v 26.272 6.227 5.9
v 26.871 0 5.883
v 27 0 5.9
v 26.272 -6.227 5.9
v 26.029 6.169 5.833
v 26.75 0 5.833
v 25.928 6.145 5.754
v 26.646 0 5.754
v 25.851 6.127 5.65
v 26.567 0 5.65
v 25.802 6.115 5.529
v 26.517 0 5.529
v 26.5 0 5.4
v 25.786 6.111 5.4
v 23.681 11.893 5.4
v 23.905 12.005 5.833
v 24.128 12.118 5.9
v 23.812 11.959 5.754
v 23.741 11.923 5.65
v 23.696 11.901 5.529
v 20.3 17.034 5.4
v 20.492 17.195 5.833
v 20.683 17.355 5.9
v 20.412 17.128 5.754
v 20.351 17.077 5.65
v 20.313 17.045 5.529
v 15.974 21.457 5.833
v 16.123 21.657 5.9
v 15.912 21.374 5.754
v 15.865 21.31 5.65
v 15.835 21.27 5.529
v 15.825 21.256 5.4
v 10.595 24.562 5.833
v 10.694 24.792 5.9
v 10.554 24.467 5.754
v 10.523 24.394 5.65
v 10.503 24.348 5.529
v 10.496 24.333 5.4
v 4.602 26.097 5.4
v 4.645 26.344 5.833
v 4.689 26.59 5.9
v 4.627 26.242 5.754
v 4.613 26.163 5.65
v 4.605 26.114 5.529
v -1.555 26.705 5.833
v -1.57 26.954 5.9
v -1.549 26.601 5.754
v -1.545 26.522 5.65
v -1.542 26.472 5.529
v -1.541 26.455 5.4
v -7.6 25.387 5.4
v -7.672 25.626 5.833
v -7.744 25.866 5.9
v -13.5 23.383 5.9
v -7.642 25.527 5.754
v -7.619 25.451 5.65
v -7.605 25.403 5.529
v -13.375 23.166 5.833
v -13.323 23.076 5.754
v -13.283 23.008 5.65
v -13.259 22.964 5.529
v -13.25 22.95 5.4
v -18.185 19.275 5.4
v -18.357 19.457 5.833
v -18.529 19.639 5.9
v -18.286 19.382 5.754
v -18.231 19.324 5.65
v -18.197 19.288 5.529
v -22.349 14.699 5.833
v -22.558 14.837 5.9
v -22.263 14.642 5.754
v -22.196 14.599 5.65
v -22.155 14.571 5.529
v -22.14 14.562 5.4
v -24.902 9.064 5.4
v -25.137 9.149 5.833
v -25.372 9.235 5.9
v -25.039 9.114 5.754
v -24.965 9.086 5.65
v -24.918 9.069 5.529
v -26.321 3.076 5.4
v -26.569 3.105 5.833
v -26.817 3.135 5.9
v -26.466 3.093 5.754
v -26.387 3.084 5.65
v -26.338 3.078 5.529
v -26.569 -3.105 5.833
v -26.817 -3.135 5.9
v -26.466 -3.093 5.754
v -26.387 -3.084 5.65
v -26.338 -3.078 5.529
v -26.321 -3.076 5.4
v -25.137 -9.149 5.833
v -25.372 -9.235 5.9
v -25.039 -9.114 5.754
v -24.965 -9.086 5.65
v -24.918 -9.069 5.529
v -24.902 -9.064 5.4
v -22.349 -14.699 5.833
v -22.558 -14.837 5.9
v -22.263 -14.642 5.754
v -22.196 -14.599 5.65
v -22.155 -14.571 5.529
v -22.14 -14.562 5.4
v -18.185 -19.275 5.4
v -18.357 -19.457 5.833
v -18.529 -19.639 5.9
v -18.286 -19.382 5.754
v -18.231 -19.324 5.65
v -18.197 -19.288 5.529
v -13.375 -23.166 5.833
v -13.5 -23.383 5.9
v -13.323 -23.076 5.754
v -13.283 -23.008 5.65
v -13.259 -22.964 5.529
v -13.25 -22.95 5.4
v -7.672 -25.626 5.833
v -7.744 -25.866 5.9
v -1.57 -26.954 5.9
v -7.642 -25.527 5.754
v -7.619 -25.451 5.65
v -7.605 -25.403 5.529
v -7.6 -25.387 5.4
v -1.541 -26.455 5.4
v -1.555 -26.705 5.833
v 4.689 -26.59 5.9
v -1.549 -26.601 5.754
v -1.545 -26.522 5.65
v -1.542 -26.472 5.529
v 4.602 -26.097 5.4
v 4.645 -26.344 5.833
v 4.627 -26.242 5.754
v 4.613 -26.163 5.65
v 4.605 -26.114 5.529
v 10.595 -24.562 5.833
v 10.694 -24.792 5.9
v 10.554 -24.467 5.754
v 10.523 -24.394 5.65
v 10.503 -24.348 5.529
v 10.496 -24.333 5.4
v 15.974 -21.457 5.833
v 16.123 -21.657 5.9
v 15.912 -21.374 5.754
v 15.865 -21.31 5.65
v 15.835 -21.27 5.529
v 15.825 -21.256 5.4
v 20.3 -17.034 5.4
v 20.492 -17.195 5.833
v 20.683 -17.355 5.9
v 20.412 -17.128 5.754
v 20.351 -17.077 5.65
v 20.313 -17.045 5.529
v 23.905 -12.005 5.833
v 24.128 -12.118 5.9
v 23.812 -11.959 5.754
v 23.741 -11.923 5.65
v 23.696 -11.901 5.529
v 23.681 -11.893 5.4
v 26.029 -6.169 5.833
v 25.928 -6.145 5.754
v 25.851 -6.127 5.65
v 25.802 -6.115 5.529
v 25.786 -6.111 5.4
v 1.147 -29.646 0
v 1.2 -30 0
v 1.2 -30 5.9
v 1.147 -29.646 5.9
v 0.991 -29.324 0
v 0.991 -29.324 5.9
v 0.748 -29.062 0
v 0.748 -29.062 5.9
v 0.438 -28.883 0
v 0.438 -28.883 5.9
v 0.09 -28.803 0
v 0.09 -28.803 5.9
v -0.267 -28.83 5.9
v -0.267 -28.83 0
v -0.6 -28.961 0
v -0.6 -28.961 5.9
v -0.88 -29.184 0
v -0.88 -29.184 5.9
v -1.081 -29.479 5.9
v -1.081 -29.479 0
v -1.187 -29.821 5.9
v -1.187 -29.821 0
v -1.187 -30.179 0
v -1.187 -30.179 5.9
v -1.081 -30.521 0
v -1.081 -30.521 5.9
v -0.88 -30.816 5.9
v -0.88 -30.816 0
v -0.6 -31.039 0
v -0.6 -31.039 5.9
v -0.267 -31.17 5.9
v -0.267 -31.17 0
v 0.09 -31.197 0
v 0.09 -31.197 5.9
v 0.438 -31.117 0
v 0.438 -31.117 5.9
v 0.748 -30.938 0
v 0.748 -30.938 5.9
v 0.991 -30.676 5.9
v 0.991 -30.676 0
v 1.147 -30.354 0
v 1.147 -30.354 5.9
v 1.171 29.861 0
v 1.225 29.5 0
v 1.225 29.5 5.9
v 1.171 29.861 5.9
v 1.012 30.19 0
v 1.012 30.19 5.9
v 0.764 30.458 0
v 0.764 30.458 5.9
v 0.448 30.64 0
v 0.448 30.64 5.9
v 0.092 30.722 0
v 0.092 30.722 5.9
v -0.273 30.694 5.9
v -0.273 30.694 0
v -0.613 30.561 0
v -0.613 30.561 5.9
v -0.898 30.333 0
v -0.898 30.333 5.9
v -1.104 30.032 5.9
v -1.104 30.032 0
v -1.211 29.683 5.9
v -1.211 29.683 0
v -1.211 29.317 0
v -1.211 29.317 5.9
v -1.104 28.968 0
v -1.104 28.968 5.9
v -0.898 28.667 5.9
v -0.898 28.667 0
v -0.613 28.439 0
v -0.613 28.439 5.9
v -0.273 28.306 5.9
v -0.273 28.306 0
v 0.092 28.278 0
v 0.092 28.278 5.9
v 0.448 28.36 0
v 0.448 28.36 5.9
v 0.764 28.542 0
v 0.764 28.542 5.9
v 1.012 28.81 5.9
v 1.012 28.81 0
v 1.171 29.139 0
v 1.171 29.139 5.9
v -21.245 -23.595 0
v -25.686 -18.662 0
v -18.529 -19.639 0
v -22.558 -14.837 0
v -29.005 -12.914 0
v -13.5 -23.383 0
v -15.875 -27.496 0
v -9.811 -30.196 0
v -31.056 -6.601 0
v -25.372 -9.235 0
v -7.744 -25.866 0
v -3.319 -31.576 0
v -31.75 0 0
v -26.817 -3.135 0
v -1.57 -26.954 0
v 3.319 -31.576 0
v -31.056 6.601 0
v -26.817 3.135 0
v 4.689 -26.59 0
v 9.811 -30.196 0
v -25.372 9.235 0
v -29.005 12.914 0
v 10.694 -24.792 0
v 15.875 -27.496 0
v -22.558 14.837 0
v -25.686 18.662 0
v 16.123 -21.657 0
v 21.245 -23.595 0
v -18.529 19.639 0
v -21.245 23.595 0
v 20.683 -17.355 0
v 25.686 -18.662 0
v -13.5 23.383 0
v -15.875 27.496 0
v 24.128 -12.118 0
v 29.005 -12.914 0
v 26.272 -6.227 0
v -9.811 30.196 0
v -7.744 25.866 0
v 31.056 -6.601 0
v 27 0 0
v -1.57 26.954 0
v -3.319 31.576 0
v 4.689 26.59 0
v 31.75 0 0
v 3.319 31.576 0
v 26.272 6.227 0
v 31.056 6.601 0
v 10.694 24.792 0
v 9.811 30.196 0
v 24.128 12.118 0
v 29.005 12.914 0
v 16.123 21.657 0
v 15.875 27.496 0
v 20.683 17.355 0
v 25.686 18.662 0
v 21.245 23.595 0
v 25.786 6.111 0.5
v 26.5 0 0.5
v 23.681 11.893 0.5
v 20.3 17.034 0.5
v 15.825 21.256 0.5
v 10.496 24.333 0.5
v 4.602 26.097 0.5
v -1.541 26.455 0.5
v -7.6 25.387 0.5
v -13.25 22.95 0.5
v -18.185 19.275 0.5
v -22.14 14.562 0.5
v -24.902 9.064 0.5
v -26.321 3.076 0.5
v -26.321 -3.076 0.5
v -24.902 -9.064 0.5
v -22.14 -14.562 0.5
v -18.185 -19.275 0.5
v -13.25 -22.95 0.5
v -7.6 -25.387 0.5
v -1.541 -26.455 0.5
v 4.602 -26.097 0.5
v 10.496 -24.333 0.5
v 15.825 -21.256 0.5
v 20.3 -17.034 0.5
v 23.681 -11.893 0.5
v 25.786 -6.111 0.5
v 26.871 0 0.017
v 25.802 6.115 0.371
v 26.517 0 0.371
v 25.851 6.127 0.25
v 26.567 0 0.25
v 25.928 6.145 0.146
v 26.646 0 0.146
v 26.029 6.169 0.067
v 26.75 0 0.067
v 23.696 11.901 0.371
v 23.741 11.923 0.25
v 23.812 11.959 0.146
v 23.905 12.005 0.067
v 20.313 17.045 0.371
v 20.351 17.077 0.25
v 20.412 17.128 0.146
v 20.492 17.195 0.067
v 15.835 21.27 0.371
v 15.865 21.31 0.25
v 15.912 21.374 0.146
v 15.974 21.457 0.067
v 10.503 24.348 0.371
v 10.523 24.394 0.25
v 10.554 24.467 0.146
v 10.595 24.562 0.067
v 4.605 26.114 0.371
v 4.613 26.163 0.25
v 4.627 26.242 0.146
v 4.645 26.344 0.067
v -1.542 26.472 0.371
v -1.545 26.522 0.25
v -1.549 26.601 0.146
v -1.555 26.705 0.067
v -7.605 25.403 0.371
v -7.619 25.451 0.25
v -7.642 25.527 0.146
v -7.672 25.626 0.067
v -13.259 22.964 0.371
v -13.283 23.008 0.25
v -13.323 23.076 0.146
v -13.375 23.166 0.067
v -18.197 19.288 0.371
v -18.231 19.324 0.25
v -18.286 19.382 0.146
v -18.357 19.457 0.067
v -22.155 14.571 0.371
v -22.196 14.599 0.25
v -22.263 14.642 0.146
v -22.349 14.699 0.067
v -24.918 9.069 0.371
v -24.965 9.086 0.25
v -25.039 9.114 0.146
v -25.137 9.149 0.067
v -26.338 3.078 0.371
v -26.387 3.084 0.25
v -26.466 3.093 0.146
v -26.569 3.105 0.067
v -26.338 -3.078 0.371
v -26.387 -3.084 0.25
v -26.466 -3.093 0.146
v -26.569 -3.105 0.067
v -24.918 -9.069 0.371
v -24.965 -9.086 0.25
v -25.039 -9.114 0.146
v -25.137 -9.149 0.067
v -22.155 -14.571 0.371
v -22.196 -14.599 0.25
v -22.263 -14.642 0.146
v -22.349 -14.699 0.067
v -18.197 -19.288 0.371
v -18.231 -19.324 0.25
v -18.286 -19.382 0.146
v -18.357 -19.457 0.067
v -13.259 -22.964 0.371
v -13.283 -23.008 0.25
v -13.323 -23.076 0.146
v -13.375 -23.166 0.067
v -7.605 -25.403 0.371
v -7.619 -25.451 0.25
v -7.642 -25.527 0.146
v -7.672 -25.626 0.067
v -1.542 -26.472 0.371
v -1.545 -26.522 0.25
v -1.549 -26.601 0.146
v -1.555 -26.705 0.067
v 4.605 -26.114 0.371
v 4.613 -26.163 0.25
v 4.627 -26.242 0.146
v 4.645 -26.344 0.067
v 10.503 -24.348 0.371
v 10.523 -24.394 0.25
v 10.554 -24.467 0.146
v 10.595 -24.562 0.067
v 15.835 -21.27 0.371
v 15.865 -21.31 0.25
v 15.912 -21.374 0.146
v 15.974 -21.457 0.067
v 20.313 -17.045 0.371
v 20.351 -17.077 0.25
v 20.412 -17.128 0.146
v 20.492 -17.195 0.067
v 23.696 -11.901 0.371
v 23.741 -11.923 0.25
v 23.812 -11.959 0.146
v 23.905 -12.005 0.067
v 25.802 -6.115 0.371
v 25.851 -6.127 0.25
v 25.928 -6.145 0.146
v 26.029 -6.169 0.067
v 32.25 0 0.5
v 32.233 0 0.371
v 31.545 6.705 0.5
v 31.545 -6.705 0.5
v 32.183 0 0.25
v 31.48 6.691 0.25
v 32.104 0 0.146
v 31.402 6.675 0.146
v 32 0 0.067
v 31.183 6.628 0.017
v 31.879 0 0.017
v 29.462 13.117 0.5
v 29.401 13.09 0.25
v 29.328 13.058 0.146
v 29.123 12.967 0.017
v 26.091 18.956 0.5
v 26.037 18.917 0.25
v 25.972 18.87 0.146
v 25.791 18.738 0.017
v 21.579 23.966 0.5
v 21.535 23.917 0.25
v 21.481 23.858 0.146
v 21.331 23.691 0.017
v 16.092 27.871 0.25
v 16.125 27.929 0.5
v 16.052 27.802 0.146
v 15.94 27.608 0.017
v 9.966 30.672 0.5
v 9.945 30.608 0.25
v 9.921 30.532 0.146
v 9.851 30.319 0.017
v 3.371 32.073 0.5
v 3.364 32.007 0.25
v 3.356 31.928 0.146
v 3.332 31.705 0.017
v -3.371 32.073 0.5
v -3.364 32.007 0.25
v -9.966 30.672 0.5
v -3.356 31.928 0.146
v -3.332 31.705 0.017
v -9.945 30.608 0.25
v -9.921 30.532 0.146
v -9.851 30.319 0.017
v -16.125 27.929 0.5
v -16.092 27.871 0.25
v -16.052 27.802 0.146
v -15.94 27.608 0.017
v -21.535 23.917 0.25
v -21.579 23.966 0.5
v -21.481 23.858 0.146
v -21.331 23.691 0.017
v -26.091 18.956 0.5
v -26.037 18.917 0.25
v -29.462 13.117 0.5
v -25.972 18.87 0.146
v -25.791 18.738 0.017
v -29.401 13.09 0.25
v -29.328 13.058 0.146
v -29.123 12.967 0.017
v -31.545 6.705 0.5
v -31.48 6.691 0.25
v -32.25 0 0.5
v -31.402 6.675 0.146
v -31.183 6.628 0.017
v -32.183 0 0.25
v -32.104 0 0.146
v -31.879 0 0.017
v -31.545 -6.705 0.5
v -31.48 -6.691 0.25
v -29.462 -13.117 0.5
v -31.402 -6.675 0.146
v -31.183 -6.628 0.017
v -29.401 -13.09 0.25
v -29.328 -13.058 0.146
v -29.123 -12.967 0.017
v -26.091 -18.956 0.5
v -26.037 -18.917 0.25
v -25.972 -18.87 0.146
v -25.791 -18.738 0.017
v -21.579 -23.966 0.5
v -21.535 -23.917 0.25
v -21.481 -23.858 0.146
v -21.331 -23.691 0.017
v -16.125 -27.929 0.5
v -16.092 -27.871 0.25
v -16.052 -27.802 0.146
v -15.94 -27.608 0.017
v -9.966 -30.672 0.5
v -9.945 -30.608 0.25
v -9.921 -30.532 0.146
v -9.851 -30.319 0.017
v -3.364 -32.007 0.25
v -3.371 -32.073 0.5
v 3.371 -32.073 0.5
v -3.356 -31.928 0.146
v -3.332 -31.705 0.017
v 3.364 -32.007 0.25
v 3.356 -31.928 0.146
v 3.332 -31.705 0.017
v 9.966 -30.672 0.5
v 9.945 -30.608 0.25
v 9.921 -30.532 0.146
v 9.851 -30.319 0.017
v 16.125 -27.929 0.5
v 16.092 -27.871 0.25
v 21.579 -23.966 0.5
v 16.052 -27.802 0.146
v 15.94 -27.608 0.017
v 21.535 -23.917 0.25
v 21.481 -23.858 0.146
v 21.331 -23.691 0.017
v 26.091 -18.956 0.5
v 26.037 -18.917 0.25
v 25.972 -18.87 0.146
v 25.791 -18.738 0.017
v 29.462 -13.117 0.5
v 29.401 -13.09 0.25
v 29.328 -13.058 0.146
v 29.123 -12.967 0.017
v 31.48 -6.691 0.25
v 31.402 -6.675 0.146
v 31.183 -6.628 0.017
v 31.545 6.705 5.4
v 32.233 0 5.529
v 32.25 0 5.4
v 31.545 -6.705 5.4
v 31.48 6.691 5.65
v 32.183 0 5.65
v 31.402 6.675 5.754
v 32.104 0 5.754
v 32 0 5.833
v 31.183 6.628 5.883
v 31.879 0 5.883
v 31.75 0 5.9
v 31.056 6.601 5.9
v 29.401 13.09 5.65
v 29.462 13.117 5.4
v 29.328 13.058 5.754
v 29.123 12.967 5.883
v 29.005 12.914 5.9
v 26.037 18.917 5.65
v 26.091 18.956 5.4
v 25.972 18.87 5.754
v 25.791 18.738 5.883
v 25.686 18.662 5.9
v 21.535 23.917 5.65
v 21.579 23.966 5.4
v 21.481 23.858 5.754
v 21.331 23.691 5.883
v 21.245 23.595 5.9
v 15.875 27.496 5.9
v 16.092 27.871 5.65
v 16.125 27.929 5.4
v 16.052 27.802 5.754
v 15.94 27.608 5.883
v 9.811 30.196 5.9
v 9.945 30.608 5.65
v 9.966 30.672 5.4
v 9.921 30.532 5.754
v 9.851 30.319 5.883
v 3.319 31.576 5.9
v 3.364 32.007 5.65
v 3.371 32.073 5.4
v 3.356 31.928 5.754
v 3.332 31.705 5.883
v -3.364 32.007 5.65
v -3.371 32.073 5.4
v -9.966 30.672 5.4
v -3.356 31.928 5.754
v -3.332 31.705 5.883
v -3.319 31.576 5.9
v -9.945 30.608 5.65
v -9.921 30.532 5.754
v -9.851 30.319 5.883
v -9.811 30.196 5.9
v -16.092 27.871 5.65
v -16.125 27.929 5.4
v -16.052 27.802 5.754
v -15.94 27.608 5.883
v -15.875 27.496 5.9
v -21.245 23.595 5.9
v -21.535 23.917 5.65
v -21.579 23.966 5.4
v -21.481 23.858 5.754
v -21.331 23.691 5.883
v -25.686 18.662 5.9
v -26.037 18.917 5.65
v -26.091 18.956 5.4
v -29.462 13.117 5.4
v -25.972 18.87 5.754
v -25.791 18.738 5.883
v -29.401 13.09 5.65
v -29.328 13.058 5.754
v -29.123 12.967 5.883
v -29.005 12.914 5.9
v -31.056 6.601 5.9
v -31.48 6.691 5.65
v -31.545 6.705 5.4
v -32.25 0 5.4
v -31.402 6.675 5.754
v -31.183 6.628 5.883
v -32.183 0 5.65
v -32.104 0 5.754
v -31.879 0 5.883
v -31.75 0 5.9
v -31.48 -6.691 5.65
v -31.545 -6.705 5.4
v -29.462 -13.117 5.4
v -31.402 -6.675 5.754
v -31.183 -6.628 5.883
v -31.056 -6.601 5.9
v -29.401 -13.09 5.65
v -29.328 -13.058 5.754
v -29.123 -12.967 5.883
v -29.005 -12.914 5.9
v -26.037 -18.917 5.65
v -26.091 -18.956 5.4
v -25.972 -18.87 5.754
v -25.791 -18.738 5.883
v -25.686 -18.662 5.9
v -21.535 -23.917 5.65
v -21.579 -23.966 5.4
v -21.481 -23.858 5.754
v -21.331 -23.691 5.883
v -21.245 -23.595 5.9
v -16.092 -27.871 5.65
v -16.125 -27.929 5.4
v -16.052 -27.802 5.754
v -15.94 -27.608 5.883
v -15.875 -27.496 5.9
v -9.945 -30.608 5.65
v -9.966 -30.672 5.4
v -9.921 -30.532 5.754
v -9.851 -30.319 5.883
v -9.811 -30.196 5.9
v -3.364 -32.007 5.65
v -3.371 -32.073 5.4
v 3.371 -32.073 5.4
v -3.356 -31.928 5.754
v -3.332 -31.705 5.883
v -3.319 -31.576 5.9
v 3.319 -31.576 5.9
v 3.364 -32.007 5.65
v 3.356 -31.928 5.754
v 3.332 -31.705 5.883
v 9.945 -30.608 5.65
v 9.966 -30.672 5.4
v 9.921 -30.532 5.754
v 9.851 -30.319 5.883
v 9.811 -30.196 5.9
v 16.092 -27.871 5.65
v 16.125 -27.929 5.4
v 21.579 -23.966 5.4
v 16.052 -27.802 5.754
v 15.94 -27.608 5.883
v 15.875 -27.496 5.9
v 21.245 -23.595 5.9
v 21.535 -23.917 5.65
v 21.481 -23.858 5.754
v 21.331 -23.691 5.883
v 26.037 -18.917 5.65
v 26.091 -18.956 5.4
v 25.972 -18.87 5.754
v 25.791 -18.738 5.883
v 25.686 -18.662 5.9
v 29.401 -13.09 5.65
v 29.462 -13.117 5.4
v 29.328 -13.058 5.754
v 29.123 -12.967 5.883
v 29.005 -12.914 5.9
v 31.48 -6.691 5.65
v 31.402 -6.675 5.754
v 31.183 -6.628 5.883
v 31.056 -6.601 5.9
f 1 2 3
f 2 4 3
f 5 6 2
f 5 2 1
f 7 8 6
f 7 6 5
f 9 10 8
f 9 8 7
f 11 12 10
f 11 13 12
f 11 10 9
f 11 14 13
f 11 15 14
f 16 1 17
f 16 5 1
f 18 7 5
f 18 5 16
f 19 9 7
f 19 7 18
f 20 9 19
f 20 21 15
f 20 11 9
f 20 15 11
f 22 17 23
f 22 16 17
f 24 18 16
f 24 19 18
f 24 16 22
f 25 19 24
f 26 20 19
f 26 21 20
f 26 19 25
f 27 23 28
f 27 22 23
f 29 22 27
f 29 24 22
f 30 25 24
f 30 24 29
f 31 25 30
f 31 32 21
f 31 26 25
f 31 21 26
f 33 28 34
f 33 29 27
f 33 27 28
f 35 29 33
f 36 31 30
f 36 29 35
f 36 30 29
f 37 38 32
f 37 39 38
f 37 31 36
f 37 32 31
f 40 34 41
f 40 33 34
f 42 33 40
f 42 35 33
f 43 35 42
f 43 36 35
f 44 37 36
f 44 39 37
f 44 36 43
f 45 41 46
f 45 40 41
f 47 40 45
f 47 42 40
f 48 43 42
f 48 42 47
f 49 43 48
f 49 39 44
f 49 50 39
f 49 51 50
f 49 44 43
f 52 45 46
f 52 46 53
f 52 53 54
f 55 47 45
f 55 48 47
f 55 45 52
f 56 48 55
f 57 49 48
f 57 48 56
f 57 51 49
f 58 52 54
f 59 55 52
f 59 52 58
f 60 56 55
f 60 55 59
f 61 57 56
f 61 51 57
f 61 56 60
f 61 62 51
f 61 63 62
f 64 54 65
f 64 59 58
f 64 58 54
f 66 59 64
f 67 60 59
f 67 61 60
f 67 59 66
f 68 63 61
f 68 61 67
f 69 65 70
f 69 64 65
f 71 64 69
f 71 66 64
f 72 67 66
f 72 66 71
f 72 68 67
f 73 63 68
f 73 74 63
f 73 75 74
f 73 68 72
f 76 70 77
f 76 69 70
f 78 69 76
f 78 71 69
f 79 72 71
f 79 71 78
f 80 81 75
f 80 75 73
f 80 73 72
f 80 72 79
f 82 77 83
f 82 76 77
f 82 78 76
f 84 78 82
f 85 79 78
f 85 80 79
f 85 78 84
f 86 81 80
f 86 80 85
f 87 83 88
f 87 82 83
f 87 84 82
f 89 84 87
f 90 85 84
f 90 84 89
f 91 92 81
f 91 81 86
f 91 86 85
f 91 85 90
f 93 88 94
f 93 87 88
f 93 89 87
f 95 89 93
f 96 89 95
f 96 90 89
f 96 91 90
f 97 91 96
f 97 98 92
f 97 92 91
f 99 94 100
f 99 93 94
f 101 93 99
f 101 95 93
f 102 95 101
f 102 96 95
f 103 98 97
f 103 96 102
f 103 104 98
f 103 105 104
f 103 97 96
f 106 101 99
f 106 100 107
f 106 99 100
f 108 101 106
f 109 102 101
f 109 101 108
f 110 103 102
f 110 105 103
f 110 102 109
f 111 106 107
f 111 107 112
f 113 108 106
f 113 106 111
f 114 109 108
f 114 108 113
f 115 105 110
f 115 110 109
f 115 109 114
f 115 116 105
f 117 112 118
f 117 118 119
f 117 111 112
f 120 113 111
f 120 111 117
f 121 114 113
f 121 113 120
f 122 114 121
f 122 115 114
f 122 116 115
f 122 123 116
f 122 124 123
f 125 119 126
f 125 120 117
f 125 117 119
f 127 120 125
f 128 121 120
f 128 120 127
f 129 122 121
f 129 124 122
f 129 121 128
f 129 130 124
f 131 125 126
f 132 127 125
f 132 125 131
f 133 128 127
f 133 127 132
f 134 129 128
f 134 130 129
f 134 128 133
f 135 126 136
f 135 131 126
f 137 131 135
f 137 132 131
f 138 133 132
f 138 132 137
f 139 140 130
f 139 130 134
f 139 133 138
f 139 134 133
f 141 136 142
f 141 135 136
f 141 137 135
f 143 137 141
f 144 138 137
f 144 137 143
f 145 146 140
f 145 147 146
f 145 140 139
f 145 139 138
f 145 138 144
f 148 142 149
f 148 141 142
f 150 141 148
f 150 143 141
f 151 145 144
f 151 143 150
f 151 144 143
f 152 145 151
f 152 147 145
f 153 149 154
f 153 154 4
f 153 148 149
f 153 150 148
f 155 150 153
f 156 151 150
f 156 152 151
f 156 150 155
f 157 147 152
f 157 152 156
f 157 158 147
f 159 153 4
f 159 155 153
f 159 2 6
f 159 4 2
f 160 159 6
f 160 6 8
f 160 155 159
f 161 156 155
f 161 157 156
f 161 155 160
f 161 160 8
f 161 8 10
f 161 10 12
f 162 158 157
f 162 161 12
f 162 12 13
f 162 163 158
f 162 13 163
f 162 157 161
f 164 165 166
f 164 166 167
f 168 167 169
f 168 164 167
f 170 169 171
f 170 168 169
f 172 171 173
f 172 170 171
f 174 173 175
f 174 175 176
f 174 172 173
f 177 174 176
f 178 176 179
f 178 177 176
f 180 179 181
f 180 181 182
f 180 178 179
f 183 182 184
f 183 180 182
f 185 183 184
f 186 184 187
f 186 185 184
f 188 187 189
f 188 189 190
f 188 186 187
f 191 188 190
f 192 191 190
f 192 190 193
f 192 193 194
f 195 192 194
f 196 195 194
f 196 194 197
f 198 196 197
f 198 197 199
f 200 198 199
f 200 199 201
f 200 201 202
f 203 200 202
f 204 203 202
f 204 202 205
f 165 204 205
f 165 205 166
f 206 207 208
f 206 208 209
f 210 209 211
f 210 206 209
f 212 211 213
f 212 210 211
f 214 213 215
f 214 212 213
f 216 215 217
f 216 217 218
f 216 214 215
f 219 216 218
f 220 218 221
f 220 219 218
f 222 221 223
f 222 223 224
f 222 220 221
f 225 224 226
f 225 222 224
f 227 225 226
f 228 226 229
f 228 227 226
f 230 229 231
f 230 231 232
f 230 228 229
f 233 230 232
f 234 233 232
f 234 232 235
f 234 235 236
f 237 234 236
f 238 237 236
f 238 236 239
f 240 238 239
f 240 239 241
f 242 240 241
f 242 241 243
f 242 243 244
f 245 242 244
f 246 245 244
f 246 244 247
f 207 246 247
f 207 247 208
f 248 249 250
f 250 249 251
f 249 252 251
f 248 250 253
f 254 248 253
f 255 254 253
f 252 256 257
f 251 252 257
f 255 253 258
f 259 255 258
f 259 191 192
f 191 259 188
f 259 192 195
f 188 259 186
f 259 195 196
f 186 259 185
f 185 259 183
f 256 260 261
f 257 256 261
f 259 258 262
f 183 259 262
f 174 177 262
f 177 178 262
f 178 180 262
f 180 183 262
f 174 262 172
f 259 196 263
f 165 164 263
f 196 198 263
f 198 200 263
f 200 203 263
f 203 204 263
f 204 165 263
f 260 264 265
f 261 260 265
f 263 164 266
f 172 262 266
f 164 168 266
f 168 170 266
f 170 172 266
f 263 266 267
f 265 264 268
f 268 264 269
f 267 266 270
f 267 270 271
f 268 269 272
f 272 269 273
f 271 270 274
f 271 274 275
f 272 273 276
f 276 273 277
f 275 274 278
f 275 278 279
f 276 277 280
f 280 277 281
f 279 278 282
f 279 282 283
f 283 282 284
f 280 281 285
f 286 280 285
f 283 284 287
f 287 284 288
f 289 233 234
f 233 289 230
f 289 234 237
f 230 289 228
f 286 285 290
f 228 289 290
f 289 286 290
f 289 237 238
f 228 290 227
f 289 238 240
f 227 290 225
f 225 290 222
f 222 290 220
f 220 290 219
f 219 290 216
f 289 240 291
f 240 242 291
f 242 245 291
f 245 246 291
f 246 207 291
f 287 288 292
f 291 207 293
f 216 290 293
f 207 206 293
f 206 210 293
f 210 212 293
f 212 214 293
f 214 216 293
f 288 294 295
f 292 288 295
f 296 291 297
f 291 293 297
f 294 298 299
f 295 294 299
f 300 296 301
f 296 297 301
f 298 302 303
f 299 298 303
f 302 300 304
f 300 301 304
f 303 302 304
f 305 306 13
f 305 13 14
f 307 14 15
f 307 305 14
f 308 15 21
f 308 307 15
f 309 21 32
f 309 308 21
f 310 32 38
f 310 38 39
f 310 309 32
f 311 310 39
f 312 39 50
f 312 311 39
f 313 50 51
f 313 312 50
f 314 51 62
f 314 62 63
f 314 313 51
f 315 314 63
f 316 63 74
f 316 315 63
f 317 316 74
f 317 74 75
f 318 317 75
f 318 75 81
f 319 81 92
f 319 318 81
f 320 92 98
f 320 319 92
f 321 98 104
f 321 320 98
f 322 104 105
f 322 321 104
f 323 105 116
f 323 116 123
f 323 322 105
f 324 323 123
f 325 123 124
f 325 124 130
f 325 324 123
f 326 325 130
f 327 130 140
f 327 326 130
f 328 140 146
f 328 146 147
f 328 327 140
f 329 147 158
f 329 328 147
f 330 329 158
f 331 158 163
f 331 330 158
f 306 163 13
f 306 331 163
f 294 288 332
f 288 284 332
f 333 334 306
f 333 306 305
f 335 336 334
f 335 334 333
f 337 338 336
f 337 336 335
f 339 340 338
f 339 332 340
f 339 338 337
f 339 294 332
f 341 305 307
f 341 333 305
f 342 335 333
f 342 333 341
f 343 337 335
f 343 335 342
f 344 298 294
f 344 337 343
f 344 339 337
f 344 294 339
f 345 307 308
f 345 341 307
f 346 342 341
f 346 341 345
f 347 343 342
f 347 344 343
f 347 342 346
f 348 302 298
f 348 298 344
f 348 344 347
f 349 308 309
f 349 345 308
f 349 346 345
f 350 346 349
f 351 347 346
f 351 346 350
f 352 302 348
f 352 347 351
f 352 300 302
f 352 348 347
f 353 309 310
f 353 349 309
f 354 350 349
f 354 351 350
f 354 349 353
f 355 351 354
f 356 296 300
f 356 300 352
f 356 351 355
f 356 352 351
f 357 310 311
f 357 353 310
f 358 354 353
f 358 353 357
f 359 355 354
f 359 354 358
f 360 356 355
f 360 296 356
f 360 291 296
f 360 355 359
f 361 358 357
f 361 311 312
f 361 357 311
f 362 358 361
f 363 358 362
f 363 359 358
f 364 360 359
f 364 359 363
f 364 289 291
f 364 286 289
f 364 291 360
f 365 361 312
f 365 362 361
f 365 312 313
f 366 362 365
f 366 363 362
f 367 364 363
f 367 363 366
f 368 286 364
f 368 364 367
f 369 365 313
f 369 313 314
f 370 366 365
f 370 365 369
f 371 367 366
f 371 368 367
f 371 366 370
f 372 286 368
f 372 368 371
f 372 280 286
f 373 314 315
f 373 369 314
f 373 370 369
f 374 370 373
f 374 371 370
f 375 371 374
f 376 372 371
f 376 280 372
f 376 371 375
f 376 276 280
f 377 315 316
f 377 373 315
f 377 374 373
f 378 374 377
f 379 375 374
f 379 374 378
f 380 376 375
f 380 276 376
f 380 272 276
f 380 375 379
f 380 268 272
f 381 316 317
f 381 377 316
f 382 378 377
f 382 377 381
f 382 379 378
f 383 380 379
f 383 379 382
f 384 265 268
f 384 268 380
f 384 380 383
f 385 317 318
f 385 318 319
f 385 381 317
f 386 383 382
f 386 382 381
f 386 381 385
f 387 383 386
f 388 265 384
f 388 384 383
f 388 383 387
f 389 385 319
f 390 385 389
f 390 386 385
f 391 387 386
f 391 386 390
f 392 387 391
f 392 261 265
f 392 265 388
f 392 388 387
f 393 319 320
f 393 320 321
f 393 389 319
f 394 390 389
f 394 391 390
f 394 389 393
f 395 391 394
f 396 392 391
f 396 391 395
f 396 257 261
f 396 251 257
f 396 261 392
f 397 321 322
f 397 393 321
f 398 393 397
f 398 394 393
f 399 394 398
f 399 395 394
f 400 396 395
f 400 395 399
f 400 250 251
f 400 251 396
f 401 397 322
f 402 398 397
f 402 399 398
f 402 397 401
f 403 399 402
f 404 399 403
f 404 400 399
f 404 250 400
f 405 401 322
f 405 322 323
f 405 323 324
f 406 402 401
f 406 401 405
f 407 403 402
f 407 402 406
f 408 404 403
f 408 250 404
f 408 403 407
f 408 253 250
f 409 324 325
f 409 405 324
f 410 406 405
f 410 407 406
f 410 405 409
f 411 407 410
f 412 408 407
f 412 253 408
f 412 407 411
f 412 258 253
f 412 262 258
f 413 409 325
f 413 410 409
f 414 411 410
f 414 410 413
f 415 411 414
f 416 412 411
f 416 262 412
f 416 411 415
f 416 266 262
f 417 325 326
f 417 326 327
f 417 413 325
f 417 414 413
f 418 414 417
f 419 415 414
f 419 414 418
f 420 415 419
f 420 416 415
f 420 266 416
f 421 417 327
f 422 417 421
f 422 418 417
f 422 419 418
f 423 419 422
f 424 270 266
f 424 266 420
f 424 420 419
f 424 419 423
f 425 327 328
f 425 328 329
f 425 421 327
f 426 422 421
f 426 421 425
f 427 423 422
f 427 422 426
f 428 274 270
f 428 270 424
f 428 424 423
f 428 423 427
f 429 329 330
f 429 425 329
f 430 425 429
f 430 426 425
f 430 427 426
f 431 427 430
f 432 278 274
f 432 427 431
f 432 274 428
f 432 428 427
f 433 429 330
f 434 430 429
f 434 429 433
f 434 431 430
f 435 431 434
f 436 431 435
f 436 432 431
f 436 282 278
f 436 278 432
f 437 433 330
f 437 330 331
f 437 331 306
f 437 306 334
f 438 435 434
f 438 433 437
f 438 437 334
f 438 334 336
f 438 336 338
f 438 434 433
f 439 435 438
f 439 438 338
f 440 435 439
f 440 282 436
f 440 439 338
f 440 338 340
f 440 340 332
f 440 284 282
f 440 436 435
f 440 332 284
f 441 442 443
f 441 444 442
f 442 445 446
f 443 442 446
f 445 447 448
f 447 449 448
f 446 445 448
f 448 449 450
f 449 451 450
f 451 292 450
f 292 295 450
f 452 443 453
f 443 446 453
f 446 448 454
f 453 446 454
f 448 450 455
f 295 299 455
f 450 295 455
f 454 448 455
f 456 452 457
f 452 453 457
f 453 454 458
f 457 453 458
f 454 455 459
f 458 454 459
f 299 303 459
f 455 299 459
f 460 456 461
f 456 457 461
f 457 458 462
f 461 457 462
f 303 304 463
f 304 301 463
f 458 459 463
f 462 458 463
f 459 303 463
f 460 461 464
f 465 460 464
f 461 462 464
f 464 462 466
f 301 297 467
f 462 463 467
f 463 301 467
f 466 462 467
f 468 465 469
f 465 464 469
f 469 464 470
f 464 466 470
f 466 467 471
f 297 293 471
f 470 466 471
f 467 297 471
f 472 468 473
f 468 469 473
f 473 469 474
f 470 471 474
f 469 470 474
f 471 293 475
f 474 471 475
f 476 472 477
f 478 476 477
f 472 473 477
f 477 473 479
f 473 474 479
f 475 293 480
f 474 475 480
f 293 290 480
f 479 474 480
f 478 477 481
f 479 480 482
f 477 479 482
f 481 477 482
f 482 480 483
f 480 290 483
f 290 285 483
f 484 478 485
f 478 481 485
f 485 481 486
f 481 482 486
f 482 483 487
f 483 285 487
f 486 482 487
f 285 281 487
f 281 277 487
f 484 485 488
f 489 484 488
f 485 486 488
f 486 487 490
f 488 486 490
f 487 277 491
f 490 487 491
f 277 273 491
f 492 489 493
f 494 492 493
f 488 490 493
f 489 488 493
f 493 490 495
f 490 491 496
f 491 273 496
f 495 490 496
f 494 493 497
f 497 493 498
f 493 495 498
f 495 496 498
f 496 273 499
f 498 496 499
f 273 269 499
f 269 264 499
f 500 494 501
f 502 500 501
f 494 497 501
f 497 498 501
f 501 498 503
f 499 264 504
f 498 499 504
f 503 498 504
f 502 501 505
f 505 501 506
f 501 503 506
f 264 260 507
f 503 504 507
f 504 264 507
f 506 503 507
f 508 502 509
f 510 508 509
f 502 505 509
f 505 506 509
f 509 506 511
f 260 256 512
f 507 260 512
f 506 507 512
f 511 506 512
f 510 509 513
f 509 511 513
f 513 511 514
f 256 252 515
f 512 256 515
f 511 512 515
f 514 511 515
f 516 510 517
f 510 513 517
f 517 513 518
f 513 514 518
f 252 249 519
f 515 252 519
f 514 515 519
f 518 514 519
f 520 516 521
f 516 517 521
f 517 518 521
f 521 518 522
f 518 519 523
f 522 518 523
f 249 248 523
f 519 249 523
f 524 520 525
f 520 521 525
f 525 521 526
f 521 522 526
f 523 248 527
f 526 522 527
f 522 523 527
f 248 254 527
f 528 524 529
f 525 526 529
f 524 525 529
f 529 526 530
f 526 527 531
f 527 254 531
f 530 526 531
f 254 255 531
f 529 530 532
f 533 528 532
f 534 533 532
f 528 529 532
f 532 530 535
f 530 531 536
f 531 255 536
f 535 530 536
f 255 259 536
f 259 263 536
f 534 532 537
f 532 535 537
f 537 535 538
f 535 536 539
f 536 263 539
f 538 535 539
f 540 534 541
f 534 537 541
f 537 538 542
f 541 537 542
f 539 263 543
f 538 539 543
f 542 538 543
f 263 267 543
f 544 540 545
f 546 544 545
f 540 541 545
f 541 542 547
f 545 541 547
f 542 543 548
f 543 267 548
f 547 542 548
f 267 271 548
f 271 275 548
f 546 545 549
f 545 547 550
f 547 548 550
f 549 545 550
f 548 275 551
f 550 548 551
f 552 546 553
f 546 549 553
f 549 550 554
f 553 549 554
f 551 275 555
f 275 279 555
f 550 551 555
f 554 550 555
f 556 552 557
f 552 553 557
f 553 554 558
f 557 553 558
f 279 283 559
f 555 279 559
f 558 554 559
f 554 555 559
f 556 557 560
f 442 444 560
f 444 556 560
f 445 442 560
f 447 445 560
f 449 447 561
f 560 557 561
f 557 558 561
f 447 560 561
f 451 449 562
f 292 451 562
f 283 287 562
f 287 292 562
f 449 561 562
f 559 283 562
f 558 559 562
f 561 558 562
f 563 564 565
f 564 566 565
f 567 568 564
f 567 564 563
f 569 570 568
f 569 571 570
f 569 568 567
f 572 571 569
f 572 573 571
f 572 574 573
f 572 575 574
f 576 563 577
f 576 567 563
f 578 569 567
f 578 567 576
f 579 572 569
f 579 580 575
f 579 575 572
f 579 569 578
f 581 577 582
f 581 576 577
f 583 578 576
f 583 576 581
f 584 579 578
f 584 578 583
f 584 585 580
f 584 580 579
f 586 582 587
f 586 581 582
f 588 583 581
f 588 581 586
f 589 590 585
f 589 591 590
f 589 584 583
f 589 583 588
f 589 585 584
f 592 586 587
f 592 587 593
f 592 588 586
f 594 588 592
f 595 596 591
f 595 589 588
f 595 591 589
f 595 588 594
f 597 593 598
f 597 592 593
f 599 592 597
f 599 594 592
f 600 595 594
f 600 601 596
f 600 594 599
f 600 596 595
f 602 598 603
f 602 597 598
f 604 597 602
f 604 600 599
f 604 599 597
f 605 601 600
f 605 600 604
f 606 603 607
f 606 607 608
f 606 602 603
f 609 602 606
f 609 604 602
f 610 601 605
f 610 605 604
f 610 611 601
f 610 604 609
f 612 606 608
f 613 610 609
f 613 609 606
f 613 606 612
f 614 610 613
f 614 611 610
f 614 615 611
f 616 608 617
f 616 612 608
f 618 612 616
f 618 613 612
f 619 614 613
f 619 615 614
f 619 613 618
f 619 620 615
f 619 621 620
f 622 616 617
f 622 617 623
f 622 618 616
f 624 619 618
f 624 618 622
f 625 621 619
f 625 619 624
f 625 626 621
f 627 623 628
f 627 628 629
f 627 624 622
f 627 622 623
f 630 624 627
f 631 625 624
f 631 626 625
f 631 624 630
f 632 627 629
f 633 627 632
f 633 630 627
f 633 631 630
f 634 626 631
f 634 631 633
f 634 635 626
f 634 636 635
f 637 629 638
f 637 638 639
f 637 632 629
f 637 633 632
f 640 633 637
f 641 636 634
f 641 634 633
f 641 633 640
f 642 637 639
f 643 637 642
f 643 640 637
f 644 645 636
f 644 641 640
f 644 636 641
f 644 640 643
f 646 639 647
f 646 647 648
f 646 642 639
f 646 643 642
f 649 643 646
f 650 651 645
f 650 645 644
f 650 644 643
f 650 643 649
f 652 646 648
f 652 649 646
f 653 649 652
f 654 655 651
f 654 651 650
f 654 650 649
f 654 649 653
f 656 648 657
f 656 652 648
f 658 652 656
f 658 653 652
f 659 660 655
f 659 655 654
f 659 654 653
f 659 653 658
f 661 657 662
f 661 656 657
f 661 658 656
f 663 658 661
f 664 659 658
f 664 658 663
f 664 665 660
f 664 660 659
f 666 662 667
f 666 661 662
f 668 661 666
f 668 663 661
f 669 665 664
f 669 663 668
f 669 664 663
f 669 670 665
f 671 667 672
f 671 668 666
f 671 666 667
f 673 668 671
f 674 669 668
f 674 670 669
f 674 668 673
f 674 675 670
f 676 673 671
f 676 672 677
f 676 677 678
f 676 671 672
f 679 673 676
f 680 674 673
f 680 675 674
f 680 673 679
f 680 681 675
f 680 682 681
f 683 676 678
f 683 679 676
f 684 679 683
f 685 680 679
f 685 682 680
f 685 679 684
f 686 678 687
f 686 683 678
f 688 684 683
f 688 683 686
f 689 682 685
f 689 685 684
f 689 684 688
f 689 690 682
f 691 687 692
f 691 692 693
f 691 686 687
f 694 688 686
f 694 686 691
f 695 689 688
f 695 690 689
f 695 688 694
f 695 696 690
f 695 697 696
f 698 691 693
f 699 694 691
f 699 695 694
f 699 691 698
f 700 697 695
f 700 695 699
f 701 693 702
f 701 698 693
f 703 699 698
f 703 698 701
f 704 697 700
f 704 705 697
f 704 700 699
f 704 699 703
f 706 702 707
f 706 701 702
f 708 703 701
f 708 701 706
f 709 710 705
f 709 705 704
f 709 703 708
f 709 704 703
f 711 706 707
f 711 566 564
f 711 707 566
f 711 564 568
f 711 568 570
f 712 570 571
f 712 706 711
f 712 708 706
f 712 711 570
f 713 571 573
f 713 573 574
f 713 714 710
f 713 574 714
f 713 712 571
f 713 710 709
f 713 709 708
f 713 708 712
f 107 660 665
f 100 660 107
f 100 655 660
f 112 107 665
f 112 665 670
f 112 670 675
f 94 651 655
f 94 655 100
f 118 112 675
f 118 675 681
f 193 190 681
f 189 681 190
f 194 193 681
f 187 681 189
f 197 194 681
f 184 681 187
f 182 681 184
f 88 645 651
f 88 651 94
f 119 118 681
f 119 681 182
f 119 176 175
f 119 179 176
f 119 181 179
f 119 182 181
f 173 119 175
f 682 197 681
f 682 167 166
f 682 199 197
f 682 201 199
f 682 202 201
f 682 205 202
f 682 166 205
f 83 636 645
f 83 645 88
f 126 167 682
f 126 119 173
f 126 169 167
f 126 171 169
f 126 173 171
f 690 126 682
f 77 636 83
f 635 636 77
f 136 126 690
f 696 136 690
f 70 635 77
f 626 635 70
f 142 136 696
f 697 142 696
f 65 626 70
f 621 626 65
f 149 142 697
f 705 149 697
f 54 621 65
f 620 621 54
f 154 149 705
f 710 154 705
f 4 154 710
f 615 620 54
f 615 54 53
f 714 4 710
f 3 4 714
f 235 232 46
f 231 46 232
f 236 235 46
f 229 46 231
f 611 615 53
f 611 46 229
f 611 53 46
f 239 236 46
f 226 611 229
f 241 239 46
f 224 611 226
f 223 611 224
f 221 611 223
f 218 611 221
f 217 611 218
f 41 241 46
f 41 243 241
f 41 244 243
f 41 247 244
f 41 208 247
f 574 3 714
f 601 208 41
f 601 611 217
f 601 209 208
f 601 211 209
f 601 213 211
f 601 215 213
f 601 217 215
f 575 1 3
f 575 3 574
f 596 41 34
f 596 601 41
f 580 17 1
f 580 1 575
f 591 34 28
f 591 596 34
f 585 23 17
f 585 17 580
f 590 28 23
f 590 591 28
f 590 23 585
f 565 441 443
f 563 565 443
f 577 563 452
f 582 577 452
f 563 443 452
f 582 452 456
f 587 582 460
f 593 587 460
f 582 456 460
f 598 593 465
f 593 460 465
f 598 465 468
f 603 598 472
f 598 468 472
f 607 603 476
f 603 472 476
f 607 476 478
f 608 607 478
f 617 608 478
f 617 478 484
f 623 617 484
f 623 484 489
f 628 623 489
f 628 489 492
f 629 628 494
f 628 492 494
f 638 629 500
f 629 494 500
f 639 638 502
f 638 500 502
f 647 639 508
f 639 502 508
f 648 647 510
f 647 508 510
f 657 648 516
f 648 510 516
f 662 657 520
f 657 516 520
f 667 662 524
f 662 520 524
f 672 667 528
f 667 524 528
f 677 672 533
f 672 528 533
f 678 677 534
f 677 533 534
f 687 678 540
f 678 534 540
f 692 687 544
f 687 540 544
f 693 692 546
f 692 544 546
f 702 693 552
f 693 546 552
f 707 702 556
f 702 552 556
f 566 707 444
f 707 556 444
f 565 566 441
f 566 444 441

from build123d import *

# Parameters (mm, degrees)
F0_R     = 32.25
F0_R_2   = 1.2
F0_R_3   = 26.5
F0_R_4   = 1.225
F1_DEPTH = 5
F2_DEPTH = 5.9
F3_R     = 0.5
F4_R     = 0.5


with BuildPart() as f1:
    # F0 (on Top) → F1 (new body)
    with BuildSketch(Plane.XY):
        Circle(F0_R)
        with Locations((0, -30)):
            Circle(F0_R_2, mode=Mode.SUBTRACT)
        Circle(F0_R_3, mode=Mode.SUBTRACT)
        with Locations((0, 29.5)):
            Circle(F0_R_4, mode=Mode.SUBTRACT)
    extrude(amount=F1_DEPTH)

    # F0 (on Top) → F2 (join)
    with BuildSketch(Plane.XY):
        Circle(F0_R)
        with Locations((0, -30)):
            Circle(F0_R_2, mode=Mode.SUBTRACT)
        Circle(F0_R_3, mode=Mode.SUBTRACT)
        with Locations((0, 29.5)):
            Circle(F0_R_4, mode=Mode.SUBTRACT)
    extrude(amount=F2_DEPTH)

    # F3
    f3_edges = [f1.edges().sort_by_distance(p)[0] for p in [
        (-26.5, 0, 0),
        (-32.25, 0, 0),
        (-32.25, 0, 5.9),
    ]]
    fillet(f3_edges, radius=F3_R)

    # F4
    f4_edges = [f1.edges().sort_by_distance(p)[0] for p in [
        (-26.5, 0, 5.9),
        (-32.25, 0, 5.4),
    ]]
    fillet(f4_edges, radius=F4_R)


solid = f1.part
